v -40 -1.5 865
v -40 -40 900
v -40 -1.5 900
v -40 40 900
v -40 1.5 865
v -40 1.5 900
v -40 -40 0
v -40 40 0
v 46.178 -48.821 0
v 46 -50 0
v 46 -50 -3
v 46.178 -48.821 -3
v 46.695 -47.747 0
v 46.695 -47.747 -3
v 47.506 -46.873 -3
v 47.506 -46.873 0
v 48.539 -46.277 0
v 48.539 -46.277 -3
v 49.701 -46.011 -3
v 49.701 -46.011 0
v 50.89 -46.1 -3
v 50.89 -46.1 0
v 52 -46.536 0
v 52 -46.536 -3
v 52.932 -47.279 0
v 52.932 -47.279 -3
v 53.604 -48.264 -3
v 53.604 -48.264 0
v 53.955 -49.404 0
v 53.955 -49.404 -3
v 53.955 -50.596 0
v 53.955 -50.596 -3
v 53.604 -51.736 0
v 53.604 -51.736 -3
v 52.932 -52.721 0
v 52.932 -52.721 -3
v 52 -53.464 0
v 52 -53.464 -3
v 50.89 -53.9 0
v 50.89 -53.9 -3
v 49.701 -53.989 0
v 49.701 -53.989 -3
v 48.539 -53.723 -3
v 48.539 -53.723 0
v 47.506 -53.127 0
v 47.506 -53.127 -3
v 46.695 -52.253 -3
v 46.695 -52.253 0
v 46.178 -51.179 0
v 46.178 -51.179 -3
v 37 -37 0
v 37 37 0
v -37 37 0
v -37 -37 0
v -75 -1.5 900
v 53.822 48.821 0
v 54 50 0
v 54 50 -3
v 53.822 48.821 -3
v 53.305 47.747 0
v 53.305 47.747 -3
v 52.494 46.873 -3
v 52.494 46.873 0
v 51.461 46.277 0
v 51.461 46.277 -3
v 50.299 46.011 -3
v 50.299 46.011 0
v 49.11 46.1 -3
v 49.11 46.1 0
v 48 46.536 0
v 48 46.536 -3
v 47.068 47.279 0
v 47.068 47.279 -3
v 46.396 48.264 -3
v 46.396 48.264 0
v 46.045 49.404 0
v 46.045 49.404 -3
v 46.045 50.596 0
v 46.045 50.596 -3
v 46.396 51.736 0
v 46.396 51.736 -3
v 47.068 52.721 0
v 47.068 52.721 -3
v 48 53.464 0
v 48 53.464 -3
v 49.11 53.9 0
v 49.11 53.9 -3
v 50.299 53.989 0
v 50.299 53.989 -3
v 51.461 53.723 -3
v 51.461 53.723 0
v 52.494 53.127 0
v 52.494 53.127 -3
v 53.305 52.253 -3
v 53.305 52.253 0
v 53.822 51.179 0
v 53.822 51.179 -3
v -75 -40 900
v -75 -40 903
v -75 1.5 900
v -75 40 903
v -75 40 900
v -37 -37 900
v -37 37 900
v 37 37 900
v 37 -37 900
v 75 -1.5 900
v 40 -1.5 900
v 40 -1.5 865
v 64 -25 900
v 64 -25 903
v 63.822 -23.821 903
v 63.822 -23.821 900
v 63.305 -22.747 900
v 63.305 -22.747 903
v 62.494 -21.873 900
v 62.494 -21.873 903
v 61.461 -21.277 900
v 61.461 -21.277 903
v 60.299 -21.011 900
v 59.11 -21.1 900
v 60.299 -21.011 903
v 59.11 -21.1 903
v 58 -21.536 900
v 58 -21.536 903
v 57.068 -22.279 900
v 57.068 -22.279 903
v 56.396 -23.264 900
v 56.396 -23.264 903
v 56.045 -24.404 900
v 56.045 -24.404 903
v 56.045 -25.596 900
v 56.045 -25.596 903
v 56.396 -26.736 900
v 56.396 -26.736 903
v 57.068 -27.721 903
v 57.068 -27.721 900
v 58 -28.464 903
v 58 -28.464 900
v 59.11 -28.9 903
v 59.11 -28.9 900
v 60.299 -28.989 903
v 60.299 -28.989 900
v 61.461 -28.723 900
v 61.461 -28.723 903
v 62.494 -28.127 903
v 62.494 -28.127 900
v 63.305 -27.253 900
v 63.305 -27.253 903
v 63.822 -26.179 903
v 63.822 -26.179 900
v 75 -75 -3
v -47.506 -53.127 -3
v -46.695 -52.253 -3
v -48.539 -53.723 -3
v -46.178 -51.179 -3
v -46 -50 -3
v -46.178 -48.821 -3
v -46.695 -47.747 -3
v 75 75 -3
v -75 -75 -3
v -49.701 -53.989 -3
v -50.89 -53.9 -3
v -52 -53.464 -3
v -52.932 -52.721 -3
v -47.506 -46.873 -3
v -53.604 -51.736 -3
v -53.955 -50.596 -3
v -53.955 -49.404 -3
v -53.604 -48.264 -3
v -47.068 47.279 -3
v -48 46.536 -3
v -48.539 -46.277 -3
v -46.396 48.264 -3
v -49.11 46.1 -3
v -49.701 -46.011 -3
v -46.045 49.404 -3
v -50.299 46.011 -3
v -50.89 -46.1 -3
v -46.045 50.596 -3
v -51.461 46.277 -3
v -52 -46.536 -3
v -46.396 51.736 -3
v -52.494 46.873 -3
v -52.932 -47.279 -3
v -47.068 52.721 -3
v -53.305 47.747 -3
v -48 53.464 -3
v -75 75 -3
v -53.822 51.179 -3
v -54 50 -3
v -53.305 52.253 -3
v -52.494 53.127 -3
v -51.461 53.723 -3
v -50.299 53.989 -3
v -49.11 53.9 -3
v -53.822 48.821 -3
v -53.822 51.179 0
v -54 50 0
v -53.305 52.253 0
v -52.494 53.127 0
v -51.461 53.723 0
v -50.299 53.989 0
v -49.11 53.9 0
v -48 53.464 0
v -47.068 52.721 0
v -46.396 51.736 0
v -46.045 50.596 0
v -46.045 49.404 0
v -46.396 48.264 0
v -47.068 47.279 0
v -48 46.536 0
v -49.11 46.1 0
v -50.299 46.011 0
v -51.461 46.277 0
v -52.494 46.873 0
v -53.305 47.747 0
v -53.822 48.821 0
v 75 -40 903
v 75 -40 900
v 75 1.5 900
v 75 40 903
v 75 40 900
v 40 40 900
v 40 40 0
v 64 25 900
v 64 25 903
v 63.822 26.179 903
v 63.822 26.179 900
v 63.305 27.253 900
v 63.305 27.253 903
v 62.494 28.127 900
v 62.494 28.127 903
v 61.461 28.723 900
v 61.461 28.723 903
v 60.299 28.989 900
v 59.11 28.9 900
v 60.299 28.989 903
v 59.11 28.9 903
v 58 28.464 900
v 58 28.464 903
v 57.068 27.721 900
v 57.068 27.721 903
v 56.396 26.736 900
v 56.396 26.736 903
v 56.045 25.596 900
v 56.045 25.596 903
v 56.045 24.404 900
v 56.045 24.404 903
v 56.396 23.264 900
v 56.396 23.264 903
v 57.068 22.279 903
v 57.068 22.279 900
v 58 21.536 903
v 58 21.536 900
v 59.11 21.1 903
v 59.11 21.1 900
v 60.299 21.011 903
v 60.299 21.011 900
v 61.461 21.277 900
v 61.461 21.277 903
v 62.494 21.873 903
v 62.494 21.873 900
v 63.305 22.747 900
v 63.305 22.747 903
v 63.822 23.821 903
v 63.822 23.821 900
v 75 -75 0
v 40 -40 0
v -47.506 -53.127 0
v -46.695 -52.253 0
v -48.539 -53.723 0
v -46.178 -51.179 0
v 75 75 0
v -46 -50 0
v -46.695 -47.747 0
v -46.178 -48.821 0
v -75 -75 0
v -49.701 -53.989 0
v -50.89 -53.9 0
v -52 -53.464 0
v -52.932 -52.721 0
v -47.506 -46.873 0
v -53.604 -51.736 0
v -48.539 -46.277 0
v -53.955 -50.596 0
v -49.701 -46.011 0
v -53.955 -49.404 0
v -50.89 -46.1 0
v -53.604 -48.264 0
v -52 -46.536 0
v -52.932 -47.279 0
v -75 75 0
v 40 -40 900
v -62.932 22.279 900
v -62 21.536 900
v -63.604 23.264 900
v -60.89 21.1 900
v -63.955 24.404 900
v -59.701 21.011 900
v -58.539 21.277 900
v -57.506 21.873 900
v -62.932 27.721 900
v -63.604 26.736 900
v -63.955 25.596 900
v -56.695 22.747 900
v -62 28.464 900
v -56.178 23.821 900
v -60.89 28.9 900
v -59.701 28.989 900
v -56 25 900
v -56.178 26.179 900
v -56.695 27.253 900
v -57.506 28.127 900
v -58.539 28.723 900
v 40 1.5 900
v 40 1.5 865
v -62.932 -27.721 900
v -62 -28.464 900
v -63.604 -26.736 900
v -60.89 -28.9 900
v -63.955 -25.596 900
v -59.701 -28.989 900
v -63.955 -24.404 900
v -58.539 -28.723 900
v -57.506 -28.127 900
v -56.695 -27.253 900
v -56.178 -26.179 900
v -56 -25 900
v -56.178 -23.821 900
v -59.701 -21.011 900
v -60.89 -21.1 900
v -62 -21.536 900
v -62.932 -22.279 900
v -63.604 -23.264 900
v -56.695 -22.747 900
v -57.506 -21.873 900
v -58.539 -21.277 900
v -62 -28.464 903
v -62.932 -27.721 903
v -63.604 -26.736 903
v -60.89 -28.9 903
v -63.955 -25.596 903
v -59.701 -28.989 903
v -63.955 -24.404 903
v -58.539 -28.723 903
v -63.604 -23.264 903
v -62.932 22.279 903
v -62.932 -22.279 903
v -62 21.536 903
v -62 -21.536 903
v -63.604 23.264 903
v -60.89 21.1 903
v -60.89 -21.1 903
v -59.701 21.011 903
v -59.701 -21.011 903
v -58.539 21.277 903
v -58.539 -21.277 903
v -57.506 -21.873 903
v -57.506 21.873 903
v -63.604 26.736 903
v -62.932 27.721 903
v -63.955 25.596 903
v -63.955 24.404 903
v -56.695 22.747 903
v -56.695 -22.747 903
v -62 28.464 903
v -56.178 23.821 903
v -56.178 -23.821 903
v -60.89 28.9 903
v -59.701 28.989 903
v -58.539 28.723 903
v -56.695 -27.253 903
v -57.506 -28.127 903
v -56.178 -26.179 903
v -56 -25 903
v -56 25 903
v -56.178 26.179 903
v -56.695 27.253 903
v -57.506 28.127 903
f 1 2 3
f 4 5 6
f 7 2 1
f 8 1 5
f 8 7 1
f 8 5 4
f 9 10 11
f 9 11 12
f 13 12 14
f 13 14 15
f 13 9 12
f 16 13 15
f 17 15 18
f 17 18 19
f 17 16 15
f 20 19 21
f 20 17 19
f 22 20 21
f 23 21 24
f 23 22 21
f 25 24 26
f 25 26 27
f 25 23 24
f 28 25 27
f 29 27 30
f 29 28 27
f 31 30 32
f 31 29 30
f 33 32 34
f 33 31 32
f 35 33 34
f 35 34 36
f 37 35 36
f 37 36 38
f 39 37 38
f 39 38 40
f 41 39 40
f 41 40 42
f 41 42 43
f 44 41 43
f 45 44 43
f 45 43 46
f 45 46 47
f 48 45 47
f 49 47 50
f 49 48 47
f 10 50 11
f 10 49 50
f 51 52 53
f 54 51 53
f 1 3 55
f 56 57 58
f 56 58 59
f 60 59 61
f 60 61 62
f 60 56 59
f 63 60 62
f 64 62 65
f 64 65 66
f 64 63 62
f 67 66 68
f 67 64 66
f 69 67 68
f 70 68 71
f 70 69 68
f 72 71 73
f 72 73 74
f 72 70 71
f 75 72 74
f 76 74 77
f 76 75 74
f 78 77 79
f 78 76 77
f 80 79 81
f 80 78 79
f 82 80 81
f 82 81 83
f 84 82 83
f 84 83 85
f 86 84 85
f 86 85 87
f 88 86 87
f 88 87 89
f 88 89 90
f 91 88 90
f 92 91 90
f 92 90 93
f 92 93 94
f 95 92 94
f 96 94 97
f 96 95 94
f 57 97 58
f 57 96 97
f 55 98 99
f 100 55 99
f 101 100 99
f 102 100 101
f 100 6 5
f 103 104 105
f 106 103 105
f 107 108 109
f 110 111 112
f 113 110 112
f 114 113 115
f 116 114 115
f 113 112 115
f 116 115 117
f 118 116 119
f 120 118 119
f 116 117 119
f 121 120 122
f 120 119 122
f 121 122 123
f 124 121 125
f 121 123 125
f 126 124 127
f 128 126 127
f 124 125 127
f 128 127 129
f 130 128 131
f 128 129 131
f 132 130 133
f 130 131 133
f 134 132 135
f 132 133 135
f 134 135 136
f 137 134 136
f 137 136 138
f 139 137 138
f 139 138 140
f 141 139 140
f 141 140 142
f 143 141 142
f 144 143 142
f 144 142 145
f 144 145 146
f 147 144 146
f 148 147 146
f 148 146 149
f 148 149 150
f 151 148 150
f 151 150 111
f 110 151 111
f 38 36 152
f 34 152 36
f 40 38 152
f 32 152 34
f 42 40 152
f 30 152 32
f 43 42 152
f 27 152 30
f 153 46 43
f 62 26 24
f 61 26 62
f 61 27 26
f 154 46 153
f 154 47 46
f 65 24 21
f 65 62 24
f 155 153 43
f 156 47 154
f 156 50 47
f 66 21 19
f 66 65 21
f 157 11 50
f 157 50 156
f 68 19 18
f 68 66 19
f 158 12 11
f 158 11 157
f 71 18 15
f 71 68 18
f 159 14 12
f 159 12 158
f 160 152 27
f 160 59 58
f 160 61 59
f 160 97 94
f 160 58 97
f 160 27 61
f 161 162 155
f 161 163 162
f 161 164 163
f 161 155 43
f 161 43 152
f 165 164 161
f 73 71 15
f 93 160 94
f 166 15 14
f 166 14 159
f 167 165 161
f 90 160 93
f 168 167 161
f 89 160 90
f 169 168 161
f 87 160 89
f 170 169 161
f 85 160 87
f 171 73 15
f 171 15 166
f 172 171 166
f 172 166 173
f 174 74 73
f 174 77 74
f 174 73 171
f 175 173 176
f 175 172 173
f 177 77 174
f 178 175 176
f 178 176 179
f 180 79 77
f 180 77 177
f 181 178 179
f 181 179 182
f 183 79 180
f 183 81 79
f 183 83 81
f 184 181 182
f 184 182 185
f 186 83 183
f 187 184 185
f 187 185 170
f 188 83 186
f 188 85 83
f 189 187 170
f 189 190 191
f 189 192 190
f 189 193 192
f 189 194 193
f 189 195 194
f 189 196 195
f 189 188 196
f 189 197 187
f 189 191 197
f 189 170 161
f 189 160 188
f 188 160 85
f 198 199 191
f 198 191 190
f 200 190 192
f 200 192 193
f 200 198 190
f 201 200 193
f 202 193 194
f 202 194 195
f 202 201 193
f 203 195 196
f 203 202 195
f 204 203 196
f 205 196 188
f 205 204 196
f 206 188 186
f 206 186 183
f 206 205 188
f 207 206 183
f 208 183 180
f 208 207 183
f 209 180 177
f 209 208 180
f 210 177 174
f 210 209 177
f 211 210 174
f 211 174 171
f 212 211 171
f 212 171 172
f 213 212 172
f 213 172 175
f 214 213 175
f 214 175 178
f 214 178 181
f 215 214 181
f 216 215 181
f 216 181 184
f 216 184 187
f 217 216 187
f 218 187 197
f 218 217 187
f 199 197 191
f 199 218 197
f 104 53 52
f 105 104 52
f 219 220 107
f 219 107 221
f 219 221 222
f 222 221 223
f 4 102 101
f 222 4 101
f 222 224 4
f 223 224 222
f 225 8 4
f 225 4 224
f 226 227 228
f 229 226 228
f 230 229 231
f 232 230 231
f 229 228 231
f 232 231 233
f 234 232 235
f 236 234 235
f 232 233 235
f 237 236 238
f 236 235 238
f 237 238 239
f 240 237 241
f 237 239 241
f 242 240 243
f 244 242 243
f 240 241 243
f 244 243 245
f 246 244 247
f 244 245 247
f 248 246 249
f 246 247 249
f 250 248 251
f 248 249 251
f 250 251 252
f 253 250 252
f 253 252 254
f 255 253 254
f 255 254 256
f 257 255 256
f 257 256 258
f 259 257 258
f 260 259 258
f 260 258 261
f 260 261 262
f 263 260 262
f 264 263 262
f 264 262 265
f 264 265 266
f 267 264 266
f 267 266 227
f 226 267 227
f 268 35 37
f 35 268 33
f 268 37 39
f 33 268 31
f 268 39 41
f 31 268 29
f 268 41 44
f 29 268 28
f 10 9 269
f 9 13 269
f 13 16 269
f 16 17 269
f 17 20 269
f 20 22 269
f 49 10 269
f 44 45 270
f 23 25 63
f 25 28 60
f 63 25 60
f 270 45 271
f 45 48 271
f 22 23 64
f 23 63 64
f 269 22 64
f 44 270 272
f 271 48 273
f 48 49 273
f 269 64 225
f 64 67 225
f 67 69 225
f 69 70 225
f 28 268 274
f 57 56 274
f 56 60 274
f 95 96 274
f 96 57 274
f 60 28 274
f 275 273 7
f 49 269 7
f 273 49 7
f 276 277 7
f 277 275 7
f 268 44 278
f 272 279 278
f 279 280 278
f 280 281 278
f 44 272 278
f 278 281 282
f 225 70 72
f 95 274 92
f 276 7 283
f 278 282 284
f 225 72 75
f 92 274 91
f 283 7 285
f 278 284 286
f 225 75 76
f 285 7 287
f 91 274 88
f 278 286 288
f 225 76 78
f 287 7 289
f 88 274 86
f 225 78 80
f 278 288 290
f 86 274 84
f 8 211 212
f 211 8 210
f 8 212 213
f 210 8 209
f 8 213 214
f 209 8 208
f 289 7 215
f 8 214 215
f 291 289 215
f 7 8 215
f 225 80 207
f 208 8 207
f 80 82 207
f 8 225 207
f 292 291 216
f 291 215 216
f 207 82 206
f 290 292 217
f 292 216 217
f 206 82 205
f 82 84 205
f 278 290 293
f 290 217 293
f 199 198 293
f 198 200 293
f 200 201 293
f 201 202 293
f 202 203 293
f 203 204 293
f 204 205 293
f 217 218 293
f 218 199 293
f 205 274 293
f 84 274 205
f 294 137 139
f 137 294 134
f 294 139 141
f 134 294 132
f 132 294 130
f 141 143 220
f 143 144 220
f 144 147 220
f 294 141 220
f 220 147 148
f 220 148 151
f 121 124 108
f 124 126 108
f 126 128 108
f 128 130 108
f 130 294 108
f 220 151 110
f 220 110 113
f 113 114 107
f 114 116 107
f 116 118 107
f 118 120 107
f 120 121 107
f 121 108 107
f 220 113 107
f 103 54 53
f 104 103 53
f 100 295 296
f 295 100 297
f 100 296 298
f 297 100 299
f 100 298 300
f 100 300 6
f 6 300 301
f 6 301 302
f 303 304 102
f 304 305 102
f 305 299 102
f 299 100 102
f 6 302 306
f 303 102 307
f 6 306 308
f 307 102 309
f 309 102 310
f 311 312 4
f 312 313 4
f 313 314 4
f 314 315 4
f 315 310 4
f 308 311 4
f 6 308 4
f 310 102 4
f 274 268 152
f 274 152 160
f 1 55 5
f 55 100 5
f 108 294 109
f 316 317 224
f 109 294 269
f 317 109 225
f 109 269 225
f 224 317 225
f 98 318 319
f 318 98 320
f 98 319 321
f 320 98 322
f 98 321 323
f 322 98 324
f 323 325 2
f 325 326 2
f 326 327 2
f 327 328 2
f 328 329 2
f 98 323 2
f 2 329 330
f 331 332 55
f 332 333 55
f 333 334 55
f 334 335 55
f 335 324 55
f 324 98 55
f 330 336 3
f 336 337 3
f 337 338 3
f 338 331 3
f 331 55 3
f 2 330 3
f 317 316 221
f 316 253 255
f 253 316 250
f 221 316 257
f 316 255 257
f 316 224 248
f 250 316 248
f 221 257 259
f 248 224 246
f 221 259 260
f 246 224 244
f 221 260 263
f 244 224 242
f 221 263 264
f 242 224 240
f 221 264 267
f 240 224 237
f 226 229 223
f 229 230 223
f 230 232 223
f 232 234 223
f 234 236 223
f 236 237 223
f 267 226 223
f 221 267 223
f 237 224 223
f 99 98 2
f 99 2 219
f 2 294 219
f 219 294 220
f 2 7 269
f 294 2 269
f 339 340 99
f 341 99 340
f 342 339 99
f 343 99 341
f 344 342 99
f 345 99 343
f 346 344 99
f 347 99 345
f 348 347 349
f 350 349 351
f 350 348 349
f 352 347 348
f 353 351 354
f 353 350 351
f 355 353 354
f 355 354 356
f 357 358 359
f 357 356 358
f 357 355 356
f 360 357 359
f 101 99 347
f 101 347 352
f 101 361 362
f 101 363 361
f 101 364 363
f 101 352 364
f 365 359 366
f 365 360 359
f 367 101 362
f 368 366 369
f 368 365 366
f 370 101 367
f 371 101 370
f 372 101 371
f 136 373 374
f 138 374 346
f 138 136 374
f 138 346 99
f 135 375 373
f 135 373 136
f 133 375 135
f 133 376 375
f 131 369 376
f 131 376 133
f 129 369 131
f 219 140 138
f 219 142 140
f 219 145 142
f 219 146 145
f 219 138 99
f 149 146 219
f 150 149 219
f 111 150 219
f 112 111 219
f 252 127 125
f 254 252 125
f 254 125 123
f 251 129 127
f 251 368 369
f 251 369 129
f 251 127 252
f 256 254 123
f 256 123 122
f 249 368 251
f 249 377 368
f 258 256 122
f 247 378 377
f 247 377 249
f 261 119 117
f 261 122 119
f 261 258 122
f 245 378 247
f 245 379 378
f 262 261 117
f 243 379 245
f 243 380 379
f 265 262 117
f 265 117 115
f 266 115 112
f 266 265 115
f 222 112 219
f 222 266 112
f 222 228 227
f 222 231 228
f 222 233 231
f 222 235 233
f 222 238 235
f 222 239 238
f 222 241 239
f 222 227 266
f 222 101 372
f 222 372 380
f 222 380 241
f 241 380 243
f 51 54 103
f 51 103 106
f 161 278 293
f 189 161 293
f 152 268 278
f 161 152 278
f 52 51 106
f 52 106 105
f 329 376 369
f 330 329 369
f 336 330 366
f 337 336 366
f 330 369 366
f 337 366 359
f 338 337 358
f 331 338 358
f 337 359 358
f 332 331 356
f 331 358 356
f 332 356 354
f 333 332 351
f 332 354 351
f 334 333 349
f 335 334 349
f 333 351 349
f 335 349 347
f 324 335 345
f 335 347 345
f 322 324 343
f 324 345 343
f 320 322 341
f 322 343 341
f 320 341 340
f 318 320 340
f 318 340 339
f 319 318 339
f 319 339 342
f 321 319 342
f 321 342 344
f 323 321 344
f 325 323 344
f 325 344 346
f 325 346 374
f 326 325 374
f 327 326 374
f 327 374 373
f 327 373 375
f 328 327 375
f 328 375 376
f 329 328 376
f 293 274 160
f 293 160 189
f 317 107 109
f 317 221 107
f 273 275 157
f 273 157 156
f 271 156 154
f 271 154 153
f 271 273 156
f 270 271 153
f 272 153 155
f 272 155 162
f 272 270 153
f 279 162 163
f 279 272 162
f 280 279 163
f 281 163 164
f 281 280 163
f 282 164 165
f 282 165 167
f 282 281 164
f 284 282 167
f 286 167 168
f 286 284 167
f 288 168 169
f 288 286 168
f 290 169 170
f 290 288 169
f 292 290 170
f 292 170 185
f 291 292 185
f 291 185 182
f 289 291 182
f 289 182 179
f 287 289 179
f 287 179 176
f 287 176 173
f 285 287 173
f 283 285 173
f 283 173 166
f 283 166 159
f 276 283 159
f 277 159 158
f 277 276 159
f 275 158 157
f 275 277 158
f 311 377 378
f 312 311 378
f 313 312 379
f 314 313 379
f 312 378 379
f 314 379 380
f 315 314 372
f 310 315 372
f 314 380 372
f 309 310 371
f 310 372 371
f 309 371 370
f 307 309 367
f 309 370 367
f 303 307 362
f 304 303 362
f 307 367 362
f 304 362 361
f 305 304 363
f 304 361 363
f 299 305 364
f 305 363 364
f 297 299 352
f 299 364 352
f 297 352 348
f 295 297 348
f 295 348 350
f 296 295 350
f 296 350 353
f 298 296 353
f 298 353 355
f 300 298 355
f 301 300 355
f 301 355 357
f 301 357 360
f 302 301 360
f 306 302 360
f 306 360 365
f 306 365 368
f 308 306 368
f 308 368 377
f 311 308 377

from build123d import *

# Parameters (mm, degrees)
SKETCH1_W           = 80
SKETCH1_H           = 80
BOSS_EXTRUDE1_DEPTH = 900
SHELL1_T            = -3
SKETCH2_W           = 150
SKETCH2_H           = 150
SKETCH2_R           = 4
BOSS_EXTRUDE2_DEPTH = 3
SKETCH6_W           = 150
SKETCH6_H           = 80
BOSS_EXTRUDE4_DEPTH = 3
CUT_EXTRUDE3_REACH  = 914.187
SKETCH7_R           = 4
BOSS_EXTRUDE5_DEPTH = 1.5


with BuildPart() as part:
    # Sketch1 → Boss-Extrude1 (new body)
    with BuildSketch(Plane.XY):
        Rectangle(SKETCH1_W, SKETCH1_H)
    extrude(amount=BOSS_EXTRUDE1_DEPTH)

    # Shell1
    shell1_openings = [part.faces().sort_by_distance(p)[0] for p in [
        (0, 0, 900),
        (0, 0, 0),
    ]]
    offset(amount=SHELL1_T, openings=shell1_openings, kind=Kind.INTERSECTION)

    # Sketch2 → Boss-Extrude2 (add)
    with BuildSketch(Plane(origin=(0, 0, 0), x_dir=(-1, 0, 0), z_dir=(0, 0, -1))):
        Rectangle(SKETCH2_W, SKETCH2_H)
        with Locations((50, 50)):
            Circle(SKETCH2_R, mode=Mode.SUBTRACT)
        with Locations(Location((-50, 50, 0), (0, 0, 180))):
            Circle(SKETCH2_R, mode=Mode.SUBTRACT)
        with Locations(Location((50, -50, 0), (0, 0, 180))):
            Circle(SKETCH2_R, mode=Mode.SUBTRACT)
        with Locations((-50, -50)):
            Circle(SKETCH2_R, mode=Mode.SUBTRACT)
    extrude(amount=BOSS_EXTRUDE2_DEPTH)

    # Sketch6 → Boss-Extrude4 (add)
    with BuildSketch(Plane.XY.offset(900)):
        Rectangle(SKETCH6_W, SKETCH6_H)
    extrude(amount=BOSS_EXTRUDE4_DEPTH)

    # Sketch7 → Cut-Extrude3 (cut, up to next)
    with BuildSketch(Plane.XY.offset(903), mode=Mode.PRIVATE) as cut_extrude3_sk1:
        with Locations((-60, 25)):
            Circle(SKETCH7_R)
    cut_extrude3_tool1 = extrude(cut_extrude3_sk1.sketch, amount=-CUT_EXTRUDE3_REACH, mode=Mode.PRIVATE) & part.part
    # Sketch7 → Cut-Extrude3 (cut, up to next)
    with BuildSketch(Plane.XY.offset(903), mode=Mode.PRIVATE) as cut_extrude3_sk2:
        with Locations((60, 25)):
            Circle(SKETCH7_R)
    cut_extrude3_tool2 = extrude(cut_extrude3_sk2.sketch, amount=-CUT_EXTRUDE3_REACH, mode=Mode.PRIVATE) & part.part
    # Sketch7 → Cut-Extrude3 (cut, up to next)
    with BuildSketch(Plane.XY.offset(903), mode=Mode.PRIVATE) as cut_extrude3_sk3:
        with Locations((60, -25)):
            Circle(SKETCH7_R)
    cut_extrude3_tool3 = extrude(cut_extrude3_sk3.sketch, amount=-CUT_EXTRUDE3_REACH, mode=Mode.PRIVATE) & part.part
    # Sketch7 → Cut-Extrude3 (cut, up to next)
    with BuildSketch(Plane.XY.offset(903), mode=Mode.PRIVATE) as cut_extrude3_sk4:
        with Locations((-60, -25)):
            Circle(SKETCH7_R)
    cut_extrude3_tool4 = extrude(cut_extrude3_sk4.sketch, amount=-CUT_EXTRUDE3_REACH, mode=Mode.PRIVATE) & part.part
    add(cut_extrude3_tool1.solids().sort_by_distance((-60, 25, 903))[0], mode=Mode.SUBTRACT)
    add(cut_extrude3_tool2.solids().sort_by_distance((60, 25, 903))[0], mode=Mode.SUBTRACT)
    add(cut_extrude3_tool3.solids().sort_by_distance((60, -25, 903))[0], mode=Mode.SUBTRACT)
    add(cut_extrude3_tool4.solids().sort_by_distance((-60, -25, 903))[0], mode=Mode.SUBTRACT)

    # Sketch10 → Boss-Extrude5 (add, symmetric)
    with BuildSketch(Plane(origin=(0, 0, 0), x_dir=(1, 0, 0), z_dir=(0, 1, 0))):
        Polygon((-40, -900), (-75, -900), (-40, -865), align=None)
    boss_extrude5 = extrude(amount=BOSS_EXTRUDE5_DEPTH, both=True)

    # Mirror3: Boss-Extrude5 across plane
    add(boss_extrude5.mirror(Plane(origin=(0, 0, 0), x_dir=(0, 0, 1), z_dir=(1, 0, 0))))


solid = part.part
